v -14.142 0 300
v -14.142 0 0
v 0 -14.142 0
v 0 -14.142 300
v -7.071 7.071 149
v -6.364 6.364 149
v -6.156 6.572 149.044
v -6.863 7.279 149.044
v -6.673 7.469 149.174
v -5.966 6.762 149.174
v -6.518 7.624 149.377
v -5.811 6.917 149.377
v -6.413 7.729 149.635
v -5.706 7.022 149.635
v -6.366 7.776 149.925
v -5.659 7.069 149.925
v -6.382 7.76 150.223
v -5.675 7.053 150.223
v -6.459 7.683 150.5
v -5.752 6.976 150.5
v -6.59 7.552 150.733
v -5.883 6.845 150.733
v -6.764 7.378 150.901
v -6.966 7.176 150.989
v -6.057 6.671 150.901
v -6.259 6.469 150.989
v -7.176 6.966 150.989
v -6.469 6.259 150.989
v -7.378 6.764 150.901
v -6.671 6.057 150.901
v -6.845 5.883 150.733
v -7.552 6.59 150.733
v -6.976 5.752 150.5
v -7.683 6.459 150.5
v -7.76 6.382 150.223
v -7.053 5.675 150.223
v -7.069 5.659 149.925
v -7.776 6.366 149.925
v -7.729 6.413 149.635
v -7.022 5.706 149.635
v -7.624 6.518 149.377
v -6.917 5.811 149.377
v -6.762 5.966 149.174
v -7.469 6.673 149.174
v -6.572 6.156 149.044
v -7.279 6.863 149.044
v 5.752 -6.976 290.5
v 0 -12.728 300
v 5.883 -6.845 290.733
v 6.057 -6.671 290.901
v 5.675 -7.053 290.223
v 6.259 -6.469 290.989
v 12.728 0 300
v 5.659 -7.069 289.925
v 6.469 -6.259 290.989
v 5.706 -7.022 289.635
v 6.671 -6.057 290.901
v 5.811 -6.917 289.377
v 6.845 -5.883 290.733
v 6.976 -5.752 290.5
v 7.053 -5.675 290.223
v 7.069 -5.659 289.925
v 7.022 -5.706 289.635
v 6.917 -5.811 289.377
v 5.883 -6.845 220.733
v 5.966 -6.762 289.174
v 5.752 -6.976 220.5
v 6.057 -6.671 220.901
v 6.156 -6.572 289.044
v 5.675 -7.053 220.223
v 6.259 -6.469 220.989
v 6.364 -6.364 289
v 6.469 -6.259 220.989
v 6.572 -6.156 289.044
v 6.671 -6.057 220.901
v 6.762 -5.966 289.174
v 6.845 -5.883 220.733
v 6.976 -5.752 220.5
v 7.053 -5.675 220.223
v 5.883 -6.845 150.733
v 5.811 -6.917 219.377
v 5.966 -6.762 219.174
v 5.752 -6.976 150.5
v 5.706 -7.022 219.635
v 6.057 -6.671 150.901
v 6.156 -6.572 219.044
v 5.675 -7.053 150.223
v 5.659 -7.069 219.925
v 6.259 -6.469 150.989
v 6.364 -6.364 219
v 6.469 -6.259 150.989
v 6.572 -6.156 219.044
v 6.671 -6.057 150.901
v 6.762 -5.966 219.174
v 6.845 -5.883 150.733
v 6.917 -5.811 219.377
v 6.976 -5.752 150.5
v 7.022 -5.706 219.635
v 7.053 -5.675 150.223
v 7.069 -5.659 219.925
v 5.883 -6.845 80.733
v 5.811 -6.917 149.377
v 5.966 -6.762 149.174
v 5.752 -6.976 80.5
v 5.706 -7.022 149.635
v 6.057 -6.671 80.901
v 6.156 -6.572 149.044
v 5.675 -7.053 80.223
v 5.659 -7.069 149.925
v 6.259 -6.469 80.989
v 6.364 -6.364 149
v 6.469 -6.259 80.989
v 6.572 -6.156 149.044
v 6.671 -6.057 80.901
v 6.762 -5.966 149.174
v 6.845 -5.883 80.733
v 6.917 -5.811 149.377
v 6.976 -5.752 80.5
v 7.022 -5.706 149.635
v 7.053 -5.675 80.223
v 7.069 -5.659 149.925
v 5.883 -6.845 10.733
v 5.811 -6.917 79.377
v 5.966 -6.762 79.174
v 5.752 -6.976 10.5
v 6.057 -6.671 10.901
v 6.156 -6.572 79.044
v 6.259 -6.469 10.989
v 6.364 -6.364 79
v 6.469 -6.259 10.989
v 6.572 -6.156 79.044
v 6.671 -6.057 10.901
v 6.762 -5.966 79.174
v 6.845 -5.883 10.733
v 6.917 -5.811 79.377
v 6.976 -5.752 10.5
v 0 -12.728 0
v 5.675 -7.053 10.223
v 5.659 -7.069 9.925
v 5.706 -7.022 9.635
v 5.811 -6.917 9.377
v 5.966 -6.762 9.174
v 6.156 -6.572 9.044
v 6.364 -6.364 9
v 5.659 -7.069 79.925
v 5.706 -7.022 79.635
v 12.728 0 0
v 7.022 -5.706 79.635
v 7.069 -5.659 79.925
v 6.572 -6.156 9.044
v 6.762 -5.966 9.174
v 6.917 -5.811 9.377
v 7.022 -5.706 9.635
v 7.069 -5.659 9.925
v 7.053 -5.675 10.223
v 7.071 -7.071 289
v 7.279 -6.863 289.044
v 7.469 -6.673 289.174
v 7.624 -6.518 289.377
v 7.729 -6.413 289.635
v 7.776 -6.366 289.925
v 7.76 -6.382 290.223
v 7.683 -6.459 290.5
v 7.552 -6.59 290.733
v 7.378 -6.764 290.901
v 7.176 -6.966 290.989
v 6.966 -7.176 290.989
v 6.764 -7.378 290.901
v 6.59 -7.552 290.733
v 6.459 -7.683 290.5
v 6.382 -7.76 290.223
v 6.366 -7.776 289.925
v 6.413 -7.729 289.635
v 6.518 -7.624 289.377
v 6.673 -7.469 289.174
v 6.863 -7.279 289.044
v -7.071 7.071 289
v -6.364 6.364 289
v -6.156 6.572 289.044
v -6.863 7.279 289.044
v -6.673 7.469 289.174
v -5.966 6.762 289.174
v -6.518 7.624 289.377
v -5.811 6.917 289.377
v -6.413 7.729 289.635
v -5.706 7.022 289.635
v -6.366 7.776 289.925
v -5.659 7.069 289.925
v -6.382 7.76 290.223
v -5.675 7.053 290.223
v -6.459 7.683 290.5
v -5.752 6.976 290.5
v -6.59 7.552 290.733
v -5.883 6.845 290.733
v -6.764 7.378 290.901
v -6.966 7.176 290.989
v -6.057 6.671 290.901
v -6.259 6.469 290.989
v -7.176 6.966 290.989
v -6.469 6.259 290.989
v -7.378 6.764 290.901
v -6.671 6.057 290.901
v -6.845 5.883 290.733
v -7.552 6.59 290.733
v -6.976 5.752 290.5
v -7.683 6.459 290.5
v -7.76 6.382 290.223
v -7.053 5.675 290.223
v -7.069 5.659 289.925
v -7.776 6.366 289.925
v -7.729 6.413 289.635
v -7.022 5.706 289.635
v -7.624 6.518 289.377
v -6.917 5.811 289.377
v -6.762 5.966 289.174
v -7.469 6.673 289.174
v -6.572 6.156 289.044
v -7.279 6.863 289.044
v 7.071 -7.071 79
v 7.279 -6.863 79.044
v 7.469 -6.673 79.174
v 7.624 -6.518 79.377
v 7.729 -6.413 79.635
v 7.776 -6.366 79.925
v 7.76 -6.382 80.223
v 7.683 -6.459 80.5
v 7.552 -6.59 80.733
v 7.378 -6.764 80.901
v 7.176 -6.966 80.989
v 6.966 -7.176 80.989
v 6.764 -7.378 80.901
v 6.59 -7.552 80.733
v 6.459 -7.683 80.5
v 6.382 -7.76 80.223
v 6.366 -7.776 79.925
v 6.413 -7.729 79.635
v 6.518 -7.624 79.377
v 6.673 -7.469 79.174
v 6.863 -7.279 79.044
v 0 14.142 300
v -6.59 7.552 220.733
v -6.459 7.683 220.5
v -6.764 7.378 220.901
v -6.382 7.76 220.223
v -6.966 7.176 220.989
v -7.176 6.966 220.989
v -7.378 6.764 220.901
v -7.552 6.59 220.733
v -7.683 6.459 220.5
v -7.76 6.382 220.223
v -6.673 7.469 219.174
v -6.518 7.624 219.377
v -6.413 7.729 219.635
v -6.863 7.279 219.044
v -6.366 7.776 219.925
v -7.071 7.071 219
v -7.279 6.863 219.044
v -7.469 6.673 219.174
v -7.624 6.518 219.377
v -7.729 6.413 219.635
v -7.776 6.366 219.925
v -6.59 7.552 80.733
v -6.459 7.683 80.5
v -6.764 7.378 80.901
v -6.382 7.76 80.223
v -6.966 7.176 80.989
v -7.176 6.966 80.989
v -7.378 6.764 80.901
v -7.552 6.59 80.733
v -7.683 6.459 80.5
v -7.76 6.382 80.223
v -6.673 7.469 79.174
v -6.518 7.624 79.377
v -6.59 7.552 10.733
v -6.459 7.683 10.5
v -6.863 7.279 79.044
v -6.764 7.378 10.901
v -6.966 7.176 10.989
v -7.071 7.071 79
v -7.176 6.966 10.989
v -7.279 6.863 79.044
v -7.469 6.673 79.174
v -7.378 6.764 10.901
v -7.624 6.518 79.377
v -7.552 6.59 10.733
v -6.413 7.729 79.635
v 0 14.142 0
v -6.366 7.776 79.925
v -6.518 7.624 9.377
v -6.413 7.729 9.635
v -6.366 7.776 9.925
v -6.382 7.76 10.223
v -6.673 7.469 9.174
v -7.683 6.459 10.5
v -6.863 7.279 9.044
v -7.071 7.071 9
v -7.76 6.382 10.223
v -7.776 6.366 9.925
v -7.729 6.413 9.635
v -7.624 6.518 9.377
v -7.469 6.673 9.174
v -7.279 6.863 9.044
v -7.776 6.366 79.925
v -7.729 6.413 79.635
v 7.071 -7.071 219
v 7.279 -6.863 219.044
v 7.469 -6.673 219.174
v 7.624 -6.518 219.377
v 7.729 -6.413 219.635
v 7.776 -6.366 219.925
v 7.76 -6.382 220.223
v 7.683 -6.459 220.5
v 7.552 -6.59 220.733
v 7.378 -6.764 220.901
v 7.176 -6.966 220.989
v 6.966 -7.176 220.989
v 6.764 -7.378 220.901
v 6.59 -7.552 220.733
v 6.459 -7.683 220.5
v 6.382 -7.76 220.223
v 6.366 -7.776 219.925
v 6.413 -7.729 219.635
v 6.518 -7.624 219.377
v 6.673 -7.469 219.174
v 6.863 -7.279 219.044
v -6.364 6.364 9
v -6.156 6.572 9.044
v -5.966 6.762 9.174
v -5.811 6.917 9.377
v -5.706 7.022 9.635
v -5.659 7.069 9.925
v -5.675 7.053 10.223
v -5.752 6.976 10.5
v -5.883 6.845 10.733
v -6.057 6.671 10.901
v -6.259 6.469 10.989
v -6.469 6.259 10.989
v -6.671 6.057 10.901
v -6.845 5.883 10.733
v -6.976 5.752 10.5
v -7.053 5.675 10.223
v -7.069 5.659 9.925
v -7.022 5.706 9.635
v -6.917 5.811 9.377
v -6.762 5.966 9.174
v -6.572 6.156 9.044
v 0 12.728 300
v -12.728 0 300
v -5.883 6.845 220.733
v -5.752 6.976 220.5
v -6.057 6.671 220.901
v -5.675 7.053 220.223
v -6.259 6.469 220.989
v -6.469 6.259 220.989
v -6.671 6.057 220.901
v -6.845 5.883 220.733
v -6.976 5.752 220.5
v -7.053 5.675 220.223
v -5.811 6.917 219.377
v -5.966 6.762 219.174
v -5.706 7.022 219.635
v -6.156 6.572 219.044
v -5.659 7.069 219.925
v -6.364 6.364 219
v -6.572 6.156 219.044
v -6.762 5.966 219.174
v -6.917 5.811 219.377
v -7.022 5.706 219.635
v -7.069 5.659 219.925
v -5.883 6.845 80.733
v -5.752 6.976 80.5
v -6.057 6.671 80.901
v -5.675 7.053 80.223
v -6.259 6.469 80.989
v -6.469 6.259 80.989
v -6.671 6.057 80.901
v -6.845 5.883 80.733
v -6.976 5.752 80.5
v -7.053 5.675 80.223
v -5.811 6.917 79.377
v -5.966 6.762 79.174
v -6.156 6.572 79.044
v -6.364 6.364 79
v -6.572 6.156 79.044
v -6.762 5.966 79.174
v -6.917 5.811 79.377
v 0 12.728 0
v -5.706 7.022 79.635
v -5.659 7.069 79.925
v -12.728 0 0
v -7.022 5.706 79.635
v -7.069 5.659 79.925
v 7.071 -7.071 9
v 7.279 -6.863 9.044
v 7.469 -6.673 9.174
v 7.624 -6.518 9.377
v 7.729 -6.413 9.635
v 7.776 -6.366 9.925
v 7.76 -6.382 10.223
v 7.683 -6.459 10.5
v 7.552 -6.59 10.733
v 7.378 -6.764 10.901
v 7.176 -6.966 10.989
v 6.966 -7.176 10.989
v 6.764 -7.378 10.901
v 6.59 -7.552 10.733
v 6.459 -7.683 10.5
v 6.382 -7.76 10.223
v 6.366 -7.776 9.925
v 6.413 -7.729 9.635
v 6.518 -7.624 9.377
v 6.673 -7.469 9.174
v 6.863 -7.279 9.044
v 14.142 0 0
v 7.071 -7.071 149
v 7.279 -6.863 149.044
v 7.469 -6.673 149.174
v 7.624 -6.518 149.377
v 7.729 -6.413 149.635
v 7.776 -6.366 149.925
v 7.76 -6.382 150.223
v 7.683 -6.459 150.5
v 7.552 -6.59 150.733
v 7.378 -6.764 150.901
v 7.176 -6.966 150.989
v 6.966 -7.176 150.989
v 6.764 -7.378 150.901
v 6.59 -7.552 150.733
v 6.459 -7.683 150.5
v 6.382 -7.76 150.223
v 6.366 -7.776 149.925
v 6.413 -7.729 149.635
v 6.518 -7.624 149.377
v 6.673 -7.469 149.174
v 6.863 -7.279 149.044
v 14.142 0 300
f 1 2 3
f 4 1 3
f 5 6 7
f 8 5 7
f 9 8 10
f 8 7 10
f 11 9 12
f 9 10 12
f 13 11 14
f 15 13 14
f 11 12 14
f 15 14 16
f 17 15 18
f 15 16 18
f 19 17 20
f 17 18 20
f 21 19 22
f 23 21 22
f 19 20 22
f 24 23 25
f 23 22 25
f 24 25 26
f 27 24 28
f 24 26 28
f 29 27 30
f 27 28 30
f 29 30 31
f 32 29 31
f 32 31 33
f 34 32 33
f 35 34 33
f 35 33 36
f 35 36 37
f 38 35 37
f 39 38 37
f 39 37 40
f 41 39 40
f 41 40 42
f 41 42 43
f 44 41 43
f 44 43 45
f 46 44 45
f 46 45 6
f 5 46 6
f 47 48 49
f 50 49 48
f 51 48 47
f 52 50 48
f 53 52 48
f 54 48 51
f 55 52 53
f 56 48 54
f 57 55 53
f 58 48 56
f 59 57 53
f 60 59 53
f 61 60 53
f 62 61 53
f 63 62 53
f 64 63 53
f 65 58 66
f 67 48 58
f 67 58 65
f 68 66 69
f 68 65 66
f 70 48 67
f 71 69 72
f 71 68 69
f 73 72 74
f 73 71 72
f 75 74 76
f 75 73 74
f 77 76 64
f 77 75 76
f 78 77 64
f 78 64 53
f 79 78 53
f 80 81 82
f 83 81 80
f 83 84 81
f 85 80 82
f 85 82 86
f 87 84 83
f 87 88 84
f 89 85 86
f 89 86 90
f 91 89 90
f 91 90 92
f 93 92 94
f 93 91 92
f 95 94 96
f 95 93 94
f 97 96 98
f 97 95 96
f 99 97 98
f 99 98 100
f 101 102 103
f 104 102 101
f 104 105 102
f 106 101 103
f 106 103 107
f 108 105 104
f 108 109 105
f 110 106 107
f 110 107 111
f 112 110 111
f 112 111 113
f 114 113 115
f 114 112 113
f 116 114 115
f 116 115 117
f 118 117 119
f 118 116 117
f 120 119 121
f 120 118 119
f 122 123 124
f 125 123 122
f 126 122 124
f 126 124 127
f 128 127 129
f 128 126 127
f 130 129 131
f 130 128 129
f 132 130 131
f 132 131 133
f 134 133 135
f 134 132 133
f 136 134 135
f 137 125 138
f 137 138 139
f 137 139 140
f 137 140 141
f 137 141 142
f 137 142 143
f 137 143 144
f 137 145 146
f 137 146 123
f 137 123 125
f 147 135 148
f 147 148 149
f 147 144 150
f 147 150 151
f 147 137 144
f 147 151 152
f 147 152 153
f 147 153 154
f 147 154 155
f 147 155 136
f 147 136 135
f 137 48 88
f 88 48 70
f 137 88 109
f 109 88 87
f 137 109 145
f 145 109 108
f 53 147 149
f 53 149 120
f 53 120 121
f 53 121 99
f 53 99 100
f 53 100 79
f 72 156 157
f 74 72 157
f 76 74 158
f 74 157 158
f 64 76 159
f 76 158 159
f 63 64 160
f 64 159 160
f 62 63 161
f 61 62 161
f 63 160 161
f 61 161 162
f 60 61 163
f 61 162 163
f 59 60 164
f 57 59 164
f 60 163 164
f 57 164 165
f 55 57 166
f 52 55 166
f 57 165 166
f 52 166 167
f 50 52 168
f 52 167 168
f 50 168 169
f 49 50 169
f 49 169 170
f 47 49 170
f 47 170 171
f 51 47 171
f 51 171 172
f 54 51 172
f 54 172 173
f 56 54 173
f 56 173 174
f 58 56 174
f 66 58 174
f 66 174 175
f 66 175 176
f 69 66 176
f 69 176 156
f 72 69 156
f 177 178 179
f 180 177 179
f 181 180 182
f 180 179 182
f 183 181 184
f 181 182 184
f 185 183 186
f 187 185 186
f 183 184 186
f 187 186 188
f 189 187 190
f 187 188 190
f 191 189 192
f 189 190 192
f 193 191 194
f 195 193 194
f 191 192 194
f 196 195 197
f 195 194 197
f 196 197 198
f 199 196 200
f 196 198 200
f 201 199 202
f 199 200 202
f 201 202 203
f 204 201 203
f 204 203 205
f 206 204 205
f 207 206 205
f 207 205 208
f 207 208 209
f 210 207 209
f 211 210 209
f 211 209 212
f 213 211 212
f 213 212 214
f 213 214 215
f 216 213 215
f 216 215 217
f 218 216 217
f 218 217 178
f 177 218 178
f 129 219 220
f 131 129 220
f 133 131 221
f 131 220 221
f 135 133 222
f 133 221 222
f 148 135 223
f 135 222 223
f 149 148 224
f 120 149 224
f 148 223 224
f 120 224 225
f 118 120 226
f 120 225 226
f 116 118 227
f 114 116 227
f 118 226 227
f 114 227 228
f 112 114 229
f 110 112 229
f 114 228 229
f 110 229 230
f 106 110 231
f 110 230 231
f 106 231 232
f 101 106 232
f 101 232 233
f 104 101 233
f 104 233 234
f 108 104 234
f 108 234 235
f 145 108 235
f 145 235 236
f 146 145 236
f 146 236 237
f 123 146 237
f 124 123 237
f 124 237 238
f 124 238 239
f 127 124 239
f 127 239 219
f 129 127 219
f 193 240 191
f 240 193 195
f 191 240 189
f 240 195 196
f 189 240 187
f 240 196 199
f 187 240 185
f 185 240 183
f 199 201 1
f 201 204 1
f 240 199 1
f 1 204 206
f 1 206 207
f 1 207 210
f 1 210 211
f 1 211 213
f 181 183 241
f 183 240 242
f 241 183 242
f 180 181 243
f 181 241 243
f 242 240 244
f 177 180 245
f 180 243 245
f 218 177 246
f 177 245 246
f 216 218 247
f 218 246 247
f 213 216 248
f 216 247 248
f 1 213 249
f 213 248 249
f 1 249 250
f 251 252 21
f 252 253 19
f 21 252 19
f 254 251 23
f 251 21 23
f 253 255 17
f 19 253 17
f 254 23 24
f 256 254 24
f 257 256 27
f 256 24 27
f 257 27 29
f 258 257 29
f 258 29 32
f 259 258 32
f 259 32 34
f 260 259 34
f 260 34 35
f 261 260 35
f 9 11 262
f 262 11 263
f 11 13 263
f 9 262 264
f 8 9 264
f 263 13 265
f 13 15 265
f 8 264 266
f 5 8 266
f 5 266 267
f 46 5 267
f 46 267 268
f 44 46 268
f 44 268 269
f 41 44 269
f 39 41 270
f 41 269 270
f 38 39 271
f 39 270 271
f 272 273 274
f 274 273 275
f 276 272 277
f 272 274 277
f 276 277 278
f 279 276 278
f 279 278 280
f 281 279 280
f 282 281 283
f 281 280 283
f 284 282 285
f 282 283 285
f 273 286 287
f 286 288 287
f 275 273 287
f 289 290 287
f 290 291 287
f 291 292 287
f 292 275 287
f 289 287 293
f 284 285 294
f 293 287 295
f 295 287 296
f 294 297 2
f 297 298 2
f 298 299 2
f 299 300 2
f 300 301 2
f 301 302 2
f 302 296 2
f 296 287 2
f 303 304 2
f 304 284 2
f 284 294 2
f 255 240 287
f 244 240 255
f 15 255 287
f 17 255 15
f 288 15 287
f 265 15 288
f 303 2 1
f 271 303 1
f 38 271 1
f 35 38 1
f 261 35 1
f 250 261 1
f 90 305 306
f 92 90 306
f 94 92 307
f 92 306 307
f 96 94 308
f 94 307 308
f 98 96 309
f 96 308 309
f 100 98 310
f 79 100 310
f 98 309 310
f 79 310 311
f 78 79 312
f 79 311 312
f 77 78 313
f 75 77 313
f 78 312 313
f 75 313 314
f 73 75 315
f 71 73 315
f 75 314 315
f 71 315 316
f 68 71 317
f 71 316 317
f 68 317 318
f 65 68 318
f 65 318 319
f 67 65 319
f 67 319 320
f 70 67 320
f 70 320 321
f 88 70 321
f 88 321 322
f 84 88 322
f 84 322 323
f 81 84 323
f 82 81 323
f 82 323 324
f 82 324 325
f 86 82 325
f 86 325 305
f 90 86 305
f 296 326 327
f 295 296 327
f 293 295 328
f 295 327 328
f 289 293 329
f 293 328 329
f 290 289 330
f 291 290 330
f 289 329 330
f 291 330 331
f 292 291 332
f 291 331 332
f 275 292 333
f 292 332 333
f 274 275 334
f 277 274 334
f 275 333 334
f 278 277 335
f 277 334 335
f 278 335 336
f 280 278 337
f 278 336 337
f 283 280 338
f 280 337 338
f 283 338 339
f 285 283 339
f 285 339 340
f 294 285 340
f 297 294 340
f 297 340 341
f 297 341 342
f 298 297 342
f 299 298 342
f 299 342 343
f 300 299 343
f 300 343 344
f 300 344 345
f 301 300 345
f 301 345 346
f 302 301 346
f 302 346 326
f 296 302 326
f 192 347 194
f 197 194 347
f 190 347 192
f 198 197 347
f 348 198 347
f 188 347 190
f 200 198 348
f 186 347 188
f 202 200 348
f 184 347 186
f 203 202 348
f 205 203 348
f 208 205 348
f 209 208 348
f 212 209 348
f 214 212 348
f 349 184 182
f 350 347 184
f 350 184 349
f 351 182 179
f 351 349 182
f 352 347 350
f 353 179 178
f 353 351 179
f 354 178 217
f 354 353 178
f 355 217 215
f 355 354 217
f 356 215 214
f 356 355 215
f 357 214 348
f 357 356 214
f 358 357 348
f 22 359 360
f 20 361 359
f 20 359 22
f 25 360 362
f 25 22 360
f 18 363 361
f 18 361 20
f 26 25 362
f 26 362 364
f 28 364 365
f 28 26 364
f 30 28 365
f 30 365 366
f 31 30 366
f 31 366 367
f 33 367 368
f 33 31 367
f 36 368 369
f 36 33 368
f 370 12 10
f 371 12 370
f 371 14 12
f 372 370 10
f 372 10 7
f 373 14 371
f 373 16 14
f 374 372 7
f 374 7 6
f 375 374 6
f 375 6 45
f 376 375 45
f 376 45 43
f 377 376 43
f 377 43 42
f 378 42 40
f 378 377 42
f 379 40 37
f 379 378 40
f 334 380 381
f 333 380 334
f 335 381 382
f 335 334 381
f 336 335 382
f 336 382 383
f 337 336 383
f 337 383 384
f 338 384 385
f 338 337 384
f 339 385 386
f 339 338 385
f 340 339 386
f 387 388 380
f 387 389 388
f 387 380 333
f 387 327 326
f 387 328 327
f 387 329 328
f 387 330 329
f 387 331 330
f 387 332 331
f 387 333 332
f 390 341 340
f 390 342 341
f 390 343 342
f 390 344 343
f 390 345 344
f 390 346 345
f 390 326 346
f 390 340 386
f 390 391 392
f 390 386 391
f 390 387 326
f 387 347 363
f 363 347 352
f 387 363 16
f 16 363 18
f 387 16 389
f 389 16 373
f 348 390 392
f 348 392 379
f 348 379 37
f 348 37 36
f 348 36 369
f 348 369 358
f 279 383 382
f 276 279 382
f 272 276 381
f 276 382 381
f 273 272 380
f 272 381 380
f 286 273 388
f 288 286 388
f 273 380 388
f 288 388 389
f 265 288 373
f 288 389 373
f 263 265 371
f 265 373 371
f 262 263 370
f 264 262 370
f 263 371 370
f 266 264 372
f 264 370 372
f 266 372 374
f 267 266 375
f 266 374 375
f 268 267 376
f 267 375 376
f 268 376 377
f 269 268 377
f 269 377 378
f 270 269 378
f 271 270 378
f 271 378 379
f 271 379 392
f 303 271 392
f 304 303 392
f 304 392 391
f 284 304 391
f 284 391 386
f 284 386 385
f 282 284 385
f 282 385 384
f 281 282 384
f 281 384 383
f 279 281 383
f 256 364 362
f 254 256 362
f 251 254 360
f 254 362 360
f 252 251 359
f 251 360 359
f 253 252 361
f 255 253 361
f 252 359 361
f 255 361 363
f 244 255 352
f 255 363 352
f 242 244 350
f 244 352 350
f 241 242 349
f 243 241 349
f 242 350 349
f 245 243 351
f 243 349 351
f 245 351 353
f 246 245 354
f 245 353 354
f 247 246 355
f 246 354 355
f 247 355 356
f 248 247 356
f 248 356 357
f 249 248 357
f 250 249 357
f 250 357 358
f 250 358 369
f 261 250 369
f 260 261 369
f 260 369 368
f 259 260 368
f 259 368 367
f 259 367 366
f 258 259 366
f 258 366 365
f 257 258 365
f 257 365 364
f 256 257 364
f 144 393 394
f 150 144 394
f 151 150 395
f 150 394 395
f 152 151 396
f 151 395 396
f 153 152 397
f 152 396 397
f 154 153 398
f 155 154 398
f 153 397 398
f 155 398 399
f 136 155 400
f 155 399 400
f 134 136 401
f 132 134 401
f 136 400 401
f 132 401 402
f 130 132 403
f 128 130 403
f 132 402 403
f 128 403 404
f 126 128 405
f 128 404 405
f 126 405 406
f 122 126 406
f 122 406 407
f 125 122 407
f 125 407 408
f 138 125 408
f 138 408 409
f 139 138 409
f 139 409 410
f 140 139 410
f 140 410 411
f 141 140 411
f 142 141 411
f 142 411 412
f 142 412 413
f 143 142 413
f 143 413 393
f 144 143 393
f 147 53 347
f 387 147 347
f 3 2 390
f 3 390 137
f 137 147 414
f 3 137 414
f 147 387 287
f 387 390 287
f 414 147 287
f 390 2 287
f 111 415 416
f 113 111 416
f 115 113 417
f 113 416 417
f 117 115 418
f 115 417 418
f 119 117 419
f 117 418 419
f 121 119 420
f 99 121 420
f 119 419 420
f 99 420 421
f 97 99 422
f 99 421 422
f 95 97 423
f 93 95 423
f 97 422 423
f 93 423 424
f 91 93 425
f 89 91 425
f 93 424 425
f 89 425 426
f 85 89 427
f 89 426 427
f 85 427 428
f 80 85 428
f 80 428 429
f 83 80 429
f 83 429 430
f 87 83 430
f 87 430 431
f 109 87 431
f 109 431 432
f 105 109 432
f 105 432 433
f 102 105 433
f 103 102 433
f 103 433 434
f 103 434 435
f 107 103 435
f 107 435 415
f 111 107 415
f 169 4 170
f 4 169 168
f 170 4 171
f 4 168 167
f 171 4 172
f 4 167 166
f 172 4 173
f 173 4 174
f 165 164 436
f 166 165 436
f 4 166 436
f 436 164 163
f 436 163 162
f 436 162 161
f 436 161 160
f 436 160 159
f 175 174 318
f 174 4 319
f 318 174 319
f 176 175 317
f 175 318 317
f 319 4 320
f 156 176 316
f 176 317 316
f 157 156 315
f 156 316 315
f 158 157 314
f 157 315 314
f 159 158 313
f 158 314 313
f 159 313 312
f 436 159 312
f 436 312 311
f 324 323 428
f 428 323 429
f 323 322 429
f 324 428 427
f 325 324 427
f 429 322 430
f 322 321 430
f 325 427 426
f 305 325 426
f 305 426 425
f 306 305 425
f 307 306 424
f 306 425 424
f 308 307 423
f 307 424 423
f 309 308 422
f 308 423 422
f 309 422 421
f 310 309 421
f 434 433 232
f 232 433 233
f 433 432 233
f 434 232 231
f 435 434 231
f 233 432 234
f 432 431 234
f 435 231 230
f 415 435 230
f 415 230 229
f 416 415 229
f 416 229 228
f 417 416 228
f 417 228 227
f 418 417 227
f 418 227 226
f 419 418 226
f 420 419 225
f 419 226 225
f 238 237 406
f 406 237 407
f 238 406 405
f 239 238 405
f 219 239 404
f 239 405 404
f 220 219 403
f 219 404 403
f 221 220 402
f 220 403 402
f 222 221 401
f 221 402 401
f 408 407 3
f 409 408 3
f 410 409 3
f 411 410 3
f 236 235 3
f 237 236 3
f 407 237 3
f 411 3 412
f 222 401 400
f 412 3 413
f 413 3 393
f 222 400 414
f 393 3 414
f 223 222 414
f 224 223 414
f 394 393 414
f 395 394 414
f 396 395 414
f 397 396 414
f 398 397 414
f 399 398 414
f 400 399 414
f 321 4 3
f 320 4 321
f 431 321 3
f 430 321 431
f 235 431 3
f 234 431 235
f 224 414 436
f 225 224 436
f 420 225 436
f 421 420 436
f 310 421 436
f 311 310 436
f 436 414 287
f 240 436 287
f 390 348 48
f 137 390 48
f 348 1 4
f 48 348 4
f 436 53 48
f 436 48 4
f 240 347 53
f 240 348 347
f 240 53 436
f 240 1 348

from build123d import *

# Parameters (mm, degrees)
EXTRUDE_1_DEPTH     = 300
SKETCH_2_R          = 1
CUT_EXTRUDE_1_DEPTH = 31


with BuildPart() as part:
    # 草图1 → 凸台-拉伸1 (new body)
    with BuildSketch(Plane.XY):
        Polygon((14.142135624, 0), (0, 14.142135624), (-14.142135624, 0), (0, -14.142135624), align=None)
        Polygon((12.727922061, 0), (0, 12.727922061), (-12.727922061, 0), (0, -12.727922061), align=None, mode=Mode.SUBTRACT)
    extrude(amount=EXTRUDE_1_DEPTH)

    # 草图2 → 切除-拉伸1 (cut, through all)
    with BuildSketch(Plane(origin=(7.071067812, -7.071067812, 0), x_dir=(0, 0, -1), z_dir=(0.707106781, -0.707106781, 0))):
        with Locations((-290, 0)):
            Circle(SKETCH_2_R)
        with Locations((-220, 0)):
            Circle(SKETCH_2_R)
        with Locations((-150, 0)):
            Circle(SKETCH_2_R)
        with Locations((-80, 0)):
            Circle(SKETCH_2_R)
        with Locations((-10, 0)):
            Circle(SKETCH_2_R)
    extrude(amount=-CUT_EXTRUDE_1_DEPTH, mode=Mode.SUBTRACT)


solid = part.part
